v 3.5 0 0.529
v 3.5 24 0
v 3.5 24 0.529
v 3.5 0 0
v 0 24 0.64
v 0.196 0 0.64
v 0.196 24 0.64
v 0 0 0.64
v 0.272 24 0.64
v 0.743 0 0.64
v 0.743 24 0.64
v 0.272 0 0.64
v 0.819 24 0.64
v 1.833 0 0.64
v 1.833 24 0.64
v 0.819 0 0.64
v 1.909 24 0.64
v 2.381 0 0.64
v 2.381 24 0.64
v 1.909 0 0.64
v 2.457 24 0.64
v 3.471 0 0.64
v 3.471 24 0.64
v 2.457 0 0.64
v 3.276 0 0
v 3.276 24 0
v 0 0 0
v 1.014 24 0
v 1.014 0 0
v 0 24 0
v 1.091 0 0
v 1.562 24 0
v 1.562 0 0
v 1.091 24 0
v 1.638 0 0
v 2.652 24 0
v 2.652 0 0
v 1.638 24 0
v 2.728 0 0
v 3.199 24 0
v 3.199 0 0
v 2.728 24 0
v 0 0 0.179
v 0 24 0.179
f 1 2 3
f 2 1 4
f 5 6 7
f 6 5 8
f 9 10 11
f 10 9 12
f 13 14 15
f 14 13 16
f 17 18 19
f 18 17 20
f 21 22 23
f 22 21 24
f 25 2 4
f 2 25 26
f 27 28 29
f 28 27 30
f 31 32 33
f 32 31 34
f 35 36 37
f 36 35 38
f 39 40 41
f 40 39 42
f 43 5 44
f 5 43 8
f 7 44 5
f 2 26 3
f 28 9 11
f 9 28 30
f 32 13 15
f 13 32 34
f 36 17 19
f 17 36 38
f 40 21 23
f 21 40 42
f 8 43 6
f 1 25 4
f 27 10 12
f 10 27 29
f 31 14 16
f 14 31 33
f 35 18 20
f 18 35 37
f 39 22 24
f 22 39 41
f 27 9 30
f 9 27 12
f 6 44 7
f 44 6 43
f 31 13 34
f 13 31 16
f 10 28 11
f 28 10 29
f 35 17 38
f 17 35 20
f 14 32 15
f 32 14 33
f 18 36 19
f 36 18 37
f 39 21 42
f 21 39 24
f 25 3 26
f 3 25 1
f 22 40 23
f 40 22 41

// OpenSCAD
L=3.5;
T=0.64;
A=1.077-1/16.0;

Kerf=0.07;

alpha = 23.0;//0.406*180.0/PI;
//alpha=38.39;

B = A-2*T*tan(alpha);
eff_kerf = Kerf/cos(alpha);

module cut()
{
    translate([-Kerf,0,-12])
    cube([Kerf,24,24]);
}

difference()
{
cube([L,24,T]);

rotate([0.0,alpha,0])
translate([0,0,0])
cut();

translate([A+1*eff_kerf,0,0])
rotate([0.0,-alpha,0])
cut();

translate([A+B+2*eff_kerf,0,0])
rotate([0.0,alpha,0])
cut();

translate([2*A+B+3*eff_kerf,0,0])
rotate([0.0,-alpha,0])
cut();

translate([2*A+2*B+4*eff_kerf,0,0])
rotate([0.0,alpha,0])
cut();

translate([3*A+2*B+5*eff_kerf,0,0])
rotate([0.0,-alpha,0])
cut();

}

echo("A", A);
echo("B", B);
echo("eff_kerf", eff_kerf);
echo("Angle", alpha);
echo("tan(angle)", tan(alpha));
